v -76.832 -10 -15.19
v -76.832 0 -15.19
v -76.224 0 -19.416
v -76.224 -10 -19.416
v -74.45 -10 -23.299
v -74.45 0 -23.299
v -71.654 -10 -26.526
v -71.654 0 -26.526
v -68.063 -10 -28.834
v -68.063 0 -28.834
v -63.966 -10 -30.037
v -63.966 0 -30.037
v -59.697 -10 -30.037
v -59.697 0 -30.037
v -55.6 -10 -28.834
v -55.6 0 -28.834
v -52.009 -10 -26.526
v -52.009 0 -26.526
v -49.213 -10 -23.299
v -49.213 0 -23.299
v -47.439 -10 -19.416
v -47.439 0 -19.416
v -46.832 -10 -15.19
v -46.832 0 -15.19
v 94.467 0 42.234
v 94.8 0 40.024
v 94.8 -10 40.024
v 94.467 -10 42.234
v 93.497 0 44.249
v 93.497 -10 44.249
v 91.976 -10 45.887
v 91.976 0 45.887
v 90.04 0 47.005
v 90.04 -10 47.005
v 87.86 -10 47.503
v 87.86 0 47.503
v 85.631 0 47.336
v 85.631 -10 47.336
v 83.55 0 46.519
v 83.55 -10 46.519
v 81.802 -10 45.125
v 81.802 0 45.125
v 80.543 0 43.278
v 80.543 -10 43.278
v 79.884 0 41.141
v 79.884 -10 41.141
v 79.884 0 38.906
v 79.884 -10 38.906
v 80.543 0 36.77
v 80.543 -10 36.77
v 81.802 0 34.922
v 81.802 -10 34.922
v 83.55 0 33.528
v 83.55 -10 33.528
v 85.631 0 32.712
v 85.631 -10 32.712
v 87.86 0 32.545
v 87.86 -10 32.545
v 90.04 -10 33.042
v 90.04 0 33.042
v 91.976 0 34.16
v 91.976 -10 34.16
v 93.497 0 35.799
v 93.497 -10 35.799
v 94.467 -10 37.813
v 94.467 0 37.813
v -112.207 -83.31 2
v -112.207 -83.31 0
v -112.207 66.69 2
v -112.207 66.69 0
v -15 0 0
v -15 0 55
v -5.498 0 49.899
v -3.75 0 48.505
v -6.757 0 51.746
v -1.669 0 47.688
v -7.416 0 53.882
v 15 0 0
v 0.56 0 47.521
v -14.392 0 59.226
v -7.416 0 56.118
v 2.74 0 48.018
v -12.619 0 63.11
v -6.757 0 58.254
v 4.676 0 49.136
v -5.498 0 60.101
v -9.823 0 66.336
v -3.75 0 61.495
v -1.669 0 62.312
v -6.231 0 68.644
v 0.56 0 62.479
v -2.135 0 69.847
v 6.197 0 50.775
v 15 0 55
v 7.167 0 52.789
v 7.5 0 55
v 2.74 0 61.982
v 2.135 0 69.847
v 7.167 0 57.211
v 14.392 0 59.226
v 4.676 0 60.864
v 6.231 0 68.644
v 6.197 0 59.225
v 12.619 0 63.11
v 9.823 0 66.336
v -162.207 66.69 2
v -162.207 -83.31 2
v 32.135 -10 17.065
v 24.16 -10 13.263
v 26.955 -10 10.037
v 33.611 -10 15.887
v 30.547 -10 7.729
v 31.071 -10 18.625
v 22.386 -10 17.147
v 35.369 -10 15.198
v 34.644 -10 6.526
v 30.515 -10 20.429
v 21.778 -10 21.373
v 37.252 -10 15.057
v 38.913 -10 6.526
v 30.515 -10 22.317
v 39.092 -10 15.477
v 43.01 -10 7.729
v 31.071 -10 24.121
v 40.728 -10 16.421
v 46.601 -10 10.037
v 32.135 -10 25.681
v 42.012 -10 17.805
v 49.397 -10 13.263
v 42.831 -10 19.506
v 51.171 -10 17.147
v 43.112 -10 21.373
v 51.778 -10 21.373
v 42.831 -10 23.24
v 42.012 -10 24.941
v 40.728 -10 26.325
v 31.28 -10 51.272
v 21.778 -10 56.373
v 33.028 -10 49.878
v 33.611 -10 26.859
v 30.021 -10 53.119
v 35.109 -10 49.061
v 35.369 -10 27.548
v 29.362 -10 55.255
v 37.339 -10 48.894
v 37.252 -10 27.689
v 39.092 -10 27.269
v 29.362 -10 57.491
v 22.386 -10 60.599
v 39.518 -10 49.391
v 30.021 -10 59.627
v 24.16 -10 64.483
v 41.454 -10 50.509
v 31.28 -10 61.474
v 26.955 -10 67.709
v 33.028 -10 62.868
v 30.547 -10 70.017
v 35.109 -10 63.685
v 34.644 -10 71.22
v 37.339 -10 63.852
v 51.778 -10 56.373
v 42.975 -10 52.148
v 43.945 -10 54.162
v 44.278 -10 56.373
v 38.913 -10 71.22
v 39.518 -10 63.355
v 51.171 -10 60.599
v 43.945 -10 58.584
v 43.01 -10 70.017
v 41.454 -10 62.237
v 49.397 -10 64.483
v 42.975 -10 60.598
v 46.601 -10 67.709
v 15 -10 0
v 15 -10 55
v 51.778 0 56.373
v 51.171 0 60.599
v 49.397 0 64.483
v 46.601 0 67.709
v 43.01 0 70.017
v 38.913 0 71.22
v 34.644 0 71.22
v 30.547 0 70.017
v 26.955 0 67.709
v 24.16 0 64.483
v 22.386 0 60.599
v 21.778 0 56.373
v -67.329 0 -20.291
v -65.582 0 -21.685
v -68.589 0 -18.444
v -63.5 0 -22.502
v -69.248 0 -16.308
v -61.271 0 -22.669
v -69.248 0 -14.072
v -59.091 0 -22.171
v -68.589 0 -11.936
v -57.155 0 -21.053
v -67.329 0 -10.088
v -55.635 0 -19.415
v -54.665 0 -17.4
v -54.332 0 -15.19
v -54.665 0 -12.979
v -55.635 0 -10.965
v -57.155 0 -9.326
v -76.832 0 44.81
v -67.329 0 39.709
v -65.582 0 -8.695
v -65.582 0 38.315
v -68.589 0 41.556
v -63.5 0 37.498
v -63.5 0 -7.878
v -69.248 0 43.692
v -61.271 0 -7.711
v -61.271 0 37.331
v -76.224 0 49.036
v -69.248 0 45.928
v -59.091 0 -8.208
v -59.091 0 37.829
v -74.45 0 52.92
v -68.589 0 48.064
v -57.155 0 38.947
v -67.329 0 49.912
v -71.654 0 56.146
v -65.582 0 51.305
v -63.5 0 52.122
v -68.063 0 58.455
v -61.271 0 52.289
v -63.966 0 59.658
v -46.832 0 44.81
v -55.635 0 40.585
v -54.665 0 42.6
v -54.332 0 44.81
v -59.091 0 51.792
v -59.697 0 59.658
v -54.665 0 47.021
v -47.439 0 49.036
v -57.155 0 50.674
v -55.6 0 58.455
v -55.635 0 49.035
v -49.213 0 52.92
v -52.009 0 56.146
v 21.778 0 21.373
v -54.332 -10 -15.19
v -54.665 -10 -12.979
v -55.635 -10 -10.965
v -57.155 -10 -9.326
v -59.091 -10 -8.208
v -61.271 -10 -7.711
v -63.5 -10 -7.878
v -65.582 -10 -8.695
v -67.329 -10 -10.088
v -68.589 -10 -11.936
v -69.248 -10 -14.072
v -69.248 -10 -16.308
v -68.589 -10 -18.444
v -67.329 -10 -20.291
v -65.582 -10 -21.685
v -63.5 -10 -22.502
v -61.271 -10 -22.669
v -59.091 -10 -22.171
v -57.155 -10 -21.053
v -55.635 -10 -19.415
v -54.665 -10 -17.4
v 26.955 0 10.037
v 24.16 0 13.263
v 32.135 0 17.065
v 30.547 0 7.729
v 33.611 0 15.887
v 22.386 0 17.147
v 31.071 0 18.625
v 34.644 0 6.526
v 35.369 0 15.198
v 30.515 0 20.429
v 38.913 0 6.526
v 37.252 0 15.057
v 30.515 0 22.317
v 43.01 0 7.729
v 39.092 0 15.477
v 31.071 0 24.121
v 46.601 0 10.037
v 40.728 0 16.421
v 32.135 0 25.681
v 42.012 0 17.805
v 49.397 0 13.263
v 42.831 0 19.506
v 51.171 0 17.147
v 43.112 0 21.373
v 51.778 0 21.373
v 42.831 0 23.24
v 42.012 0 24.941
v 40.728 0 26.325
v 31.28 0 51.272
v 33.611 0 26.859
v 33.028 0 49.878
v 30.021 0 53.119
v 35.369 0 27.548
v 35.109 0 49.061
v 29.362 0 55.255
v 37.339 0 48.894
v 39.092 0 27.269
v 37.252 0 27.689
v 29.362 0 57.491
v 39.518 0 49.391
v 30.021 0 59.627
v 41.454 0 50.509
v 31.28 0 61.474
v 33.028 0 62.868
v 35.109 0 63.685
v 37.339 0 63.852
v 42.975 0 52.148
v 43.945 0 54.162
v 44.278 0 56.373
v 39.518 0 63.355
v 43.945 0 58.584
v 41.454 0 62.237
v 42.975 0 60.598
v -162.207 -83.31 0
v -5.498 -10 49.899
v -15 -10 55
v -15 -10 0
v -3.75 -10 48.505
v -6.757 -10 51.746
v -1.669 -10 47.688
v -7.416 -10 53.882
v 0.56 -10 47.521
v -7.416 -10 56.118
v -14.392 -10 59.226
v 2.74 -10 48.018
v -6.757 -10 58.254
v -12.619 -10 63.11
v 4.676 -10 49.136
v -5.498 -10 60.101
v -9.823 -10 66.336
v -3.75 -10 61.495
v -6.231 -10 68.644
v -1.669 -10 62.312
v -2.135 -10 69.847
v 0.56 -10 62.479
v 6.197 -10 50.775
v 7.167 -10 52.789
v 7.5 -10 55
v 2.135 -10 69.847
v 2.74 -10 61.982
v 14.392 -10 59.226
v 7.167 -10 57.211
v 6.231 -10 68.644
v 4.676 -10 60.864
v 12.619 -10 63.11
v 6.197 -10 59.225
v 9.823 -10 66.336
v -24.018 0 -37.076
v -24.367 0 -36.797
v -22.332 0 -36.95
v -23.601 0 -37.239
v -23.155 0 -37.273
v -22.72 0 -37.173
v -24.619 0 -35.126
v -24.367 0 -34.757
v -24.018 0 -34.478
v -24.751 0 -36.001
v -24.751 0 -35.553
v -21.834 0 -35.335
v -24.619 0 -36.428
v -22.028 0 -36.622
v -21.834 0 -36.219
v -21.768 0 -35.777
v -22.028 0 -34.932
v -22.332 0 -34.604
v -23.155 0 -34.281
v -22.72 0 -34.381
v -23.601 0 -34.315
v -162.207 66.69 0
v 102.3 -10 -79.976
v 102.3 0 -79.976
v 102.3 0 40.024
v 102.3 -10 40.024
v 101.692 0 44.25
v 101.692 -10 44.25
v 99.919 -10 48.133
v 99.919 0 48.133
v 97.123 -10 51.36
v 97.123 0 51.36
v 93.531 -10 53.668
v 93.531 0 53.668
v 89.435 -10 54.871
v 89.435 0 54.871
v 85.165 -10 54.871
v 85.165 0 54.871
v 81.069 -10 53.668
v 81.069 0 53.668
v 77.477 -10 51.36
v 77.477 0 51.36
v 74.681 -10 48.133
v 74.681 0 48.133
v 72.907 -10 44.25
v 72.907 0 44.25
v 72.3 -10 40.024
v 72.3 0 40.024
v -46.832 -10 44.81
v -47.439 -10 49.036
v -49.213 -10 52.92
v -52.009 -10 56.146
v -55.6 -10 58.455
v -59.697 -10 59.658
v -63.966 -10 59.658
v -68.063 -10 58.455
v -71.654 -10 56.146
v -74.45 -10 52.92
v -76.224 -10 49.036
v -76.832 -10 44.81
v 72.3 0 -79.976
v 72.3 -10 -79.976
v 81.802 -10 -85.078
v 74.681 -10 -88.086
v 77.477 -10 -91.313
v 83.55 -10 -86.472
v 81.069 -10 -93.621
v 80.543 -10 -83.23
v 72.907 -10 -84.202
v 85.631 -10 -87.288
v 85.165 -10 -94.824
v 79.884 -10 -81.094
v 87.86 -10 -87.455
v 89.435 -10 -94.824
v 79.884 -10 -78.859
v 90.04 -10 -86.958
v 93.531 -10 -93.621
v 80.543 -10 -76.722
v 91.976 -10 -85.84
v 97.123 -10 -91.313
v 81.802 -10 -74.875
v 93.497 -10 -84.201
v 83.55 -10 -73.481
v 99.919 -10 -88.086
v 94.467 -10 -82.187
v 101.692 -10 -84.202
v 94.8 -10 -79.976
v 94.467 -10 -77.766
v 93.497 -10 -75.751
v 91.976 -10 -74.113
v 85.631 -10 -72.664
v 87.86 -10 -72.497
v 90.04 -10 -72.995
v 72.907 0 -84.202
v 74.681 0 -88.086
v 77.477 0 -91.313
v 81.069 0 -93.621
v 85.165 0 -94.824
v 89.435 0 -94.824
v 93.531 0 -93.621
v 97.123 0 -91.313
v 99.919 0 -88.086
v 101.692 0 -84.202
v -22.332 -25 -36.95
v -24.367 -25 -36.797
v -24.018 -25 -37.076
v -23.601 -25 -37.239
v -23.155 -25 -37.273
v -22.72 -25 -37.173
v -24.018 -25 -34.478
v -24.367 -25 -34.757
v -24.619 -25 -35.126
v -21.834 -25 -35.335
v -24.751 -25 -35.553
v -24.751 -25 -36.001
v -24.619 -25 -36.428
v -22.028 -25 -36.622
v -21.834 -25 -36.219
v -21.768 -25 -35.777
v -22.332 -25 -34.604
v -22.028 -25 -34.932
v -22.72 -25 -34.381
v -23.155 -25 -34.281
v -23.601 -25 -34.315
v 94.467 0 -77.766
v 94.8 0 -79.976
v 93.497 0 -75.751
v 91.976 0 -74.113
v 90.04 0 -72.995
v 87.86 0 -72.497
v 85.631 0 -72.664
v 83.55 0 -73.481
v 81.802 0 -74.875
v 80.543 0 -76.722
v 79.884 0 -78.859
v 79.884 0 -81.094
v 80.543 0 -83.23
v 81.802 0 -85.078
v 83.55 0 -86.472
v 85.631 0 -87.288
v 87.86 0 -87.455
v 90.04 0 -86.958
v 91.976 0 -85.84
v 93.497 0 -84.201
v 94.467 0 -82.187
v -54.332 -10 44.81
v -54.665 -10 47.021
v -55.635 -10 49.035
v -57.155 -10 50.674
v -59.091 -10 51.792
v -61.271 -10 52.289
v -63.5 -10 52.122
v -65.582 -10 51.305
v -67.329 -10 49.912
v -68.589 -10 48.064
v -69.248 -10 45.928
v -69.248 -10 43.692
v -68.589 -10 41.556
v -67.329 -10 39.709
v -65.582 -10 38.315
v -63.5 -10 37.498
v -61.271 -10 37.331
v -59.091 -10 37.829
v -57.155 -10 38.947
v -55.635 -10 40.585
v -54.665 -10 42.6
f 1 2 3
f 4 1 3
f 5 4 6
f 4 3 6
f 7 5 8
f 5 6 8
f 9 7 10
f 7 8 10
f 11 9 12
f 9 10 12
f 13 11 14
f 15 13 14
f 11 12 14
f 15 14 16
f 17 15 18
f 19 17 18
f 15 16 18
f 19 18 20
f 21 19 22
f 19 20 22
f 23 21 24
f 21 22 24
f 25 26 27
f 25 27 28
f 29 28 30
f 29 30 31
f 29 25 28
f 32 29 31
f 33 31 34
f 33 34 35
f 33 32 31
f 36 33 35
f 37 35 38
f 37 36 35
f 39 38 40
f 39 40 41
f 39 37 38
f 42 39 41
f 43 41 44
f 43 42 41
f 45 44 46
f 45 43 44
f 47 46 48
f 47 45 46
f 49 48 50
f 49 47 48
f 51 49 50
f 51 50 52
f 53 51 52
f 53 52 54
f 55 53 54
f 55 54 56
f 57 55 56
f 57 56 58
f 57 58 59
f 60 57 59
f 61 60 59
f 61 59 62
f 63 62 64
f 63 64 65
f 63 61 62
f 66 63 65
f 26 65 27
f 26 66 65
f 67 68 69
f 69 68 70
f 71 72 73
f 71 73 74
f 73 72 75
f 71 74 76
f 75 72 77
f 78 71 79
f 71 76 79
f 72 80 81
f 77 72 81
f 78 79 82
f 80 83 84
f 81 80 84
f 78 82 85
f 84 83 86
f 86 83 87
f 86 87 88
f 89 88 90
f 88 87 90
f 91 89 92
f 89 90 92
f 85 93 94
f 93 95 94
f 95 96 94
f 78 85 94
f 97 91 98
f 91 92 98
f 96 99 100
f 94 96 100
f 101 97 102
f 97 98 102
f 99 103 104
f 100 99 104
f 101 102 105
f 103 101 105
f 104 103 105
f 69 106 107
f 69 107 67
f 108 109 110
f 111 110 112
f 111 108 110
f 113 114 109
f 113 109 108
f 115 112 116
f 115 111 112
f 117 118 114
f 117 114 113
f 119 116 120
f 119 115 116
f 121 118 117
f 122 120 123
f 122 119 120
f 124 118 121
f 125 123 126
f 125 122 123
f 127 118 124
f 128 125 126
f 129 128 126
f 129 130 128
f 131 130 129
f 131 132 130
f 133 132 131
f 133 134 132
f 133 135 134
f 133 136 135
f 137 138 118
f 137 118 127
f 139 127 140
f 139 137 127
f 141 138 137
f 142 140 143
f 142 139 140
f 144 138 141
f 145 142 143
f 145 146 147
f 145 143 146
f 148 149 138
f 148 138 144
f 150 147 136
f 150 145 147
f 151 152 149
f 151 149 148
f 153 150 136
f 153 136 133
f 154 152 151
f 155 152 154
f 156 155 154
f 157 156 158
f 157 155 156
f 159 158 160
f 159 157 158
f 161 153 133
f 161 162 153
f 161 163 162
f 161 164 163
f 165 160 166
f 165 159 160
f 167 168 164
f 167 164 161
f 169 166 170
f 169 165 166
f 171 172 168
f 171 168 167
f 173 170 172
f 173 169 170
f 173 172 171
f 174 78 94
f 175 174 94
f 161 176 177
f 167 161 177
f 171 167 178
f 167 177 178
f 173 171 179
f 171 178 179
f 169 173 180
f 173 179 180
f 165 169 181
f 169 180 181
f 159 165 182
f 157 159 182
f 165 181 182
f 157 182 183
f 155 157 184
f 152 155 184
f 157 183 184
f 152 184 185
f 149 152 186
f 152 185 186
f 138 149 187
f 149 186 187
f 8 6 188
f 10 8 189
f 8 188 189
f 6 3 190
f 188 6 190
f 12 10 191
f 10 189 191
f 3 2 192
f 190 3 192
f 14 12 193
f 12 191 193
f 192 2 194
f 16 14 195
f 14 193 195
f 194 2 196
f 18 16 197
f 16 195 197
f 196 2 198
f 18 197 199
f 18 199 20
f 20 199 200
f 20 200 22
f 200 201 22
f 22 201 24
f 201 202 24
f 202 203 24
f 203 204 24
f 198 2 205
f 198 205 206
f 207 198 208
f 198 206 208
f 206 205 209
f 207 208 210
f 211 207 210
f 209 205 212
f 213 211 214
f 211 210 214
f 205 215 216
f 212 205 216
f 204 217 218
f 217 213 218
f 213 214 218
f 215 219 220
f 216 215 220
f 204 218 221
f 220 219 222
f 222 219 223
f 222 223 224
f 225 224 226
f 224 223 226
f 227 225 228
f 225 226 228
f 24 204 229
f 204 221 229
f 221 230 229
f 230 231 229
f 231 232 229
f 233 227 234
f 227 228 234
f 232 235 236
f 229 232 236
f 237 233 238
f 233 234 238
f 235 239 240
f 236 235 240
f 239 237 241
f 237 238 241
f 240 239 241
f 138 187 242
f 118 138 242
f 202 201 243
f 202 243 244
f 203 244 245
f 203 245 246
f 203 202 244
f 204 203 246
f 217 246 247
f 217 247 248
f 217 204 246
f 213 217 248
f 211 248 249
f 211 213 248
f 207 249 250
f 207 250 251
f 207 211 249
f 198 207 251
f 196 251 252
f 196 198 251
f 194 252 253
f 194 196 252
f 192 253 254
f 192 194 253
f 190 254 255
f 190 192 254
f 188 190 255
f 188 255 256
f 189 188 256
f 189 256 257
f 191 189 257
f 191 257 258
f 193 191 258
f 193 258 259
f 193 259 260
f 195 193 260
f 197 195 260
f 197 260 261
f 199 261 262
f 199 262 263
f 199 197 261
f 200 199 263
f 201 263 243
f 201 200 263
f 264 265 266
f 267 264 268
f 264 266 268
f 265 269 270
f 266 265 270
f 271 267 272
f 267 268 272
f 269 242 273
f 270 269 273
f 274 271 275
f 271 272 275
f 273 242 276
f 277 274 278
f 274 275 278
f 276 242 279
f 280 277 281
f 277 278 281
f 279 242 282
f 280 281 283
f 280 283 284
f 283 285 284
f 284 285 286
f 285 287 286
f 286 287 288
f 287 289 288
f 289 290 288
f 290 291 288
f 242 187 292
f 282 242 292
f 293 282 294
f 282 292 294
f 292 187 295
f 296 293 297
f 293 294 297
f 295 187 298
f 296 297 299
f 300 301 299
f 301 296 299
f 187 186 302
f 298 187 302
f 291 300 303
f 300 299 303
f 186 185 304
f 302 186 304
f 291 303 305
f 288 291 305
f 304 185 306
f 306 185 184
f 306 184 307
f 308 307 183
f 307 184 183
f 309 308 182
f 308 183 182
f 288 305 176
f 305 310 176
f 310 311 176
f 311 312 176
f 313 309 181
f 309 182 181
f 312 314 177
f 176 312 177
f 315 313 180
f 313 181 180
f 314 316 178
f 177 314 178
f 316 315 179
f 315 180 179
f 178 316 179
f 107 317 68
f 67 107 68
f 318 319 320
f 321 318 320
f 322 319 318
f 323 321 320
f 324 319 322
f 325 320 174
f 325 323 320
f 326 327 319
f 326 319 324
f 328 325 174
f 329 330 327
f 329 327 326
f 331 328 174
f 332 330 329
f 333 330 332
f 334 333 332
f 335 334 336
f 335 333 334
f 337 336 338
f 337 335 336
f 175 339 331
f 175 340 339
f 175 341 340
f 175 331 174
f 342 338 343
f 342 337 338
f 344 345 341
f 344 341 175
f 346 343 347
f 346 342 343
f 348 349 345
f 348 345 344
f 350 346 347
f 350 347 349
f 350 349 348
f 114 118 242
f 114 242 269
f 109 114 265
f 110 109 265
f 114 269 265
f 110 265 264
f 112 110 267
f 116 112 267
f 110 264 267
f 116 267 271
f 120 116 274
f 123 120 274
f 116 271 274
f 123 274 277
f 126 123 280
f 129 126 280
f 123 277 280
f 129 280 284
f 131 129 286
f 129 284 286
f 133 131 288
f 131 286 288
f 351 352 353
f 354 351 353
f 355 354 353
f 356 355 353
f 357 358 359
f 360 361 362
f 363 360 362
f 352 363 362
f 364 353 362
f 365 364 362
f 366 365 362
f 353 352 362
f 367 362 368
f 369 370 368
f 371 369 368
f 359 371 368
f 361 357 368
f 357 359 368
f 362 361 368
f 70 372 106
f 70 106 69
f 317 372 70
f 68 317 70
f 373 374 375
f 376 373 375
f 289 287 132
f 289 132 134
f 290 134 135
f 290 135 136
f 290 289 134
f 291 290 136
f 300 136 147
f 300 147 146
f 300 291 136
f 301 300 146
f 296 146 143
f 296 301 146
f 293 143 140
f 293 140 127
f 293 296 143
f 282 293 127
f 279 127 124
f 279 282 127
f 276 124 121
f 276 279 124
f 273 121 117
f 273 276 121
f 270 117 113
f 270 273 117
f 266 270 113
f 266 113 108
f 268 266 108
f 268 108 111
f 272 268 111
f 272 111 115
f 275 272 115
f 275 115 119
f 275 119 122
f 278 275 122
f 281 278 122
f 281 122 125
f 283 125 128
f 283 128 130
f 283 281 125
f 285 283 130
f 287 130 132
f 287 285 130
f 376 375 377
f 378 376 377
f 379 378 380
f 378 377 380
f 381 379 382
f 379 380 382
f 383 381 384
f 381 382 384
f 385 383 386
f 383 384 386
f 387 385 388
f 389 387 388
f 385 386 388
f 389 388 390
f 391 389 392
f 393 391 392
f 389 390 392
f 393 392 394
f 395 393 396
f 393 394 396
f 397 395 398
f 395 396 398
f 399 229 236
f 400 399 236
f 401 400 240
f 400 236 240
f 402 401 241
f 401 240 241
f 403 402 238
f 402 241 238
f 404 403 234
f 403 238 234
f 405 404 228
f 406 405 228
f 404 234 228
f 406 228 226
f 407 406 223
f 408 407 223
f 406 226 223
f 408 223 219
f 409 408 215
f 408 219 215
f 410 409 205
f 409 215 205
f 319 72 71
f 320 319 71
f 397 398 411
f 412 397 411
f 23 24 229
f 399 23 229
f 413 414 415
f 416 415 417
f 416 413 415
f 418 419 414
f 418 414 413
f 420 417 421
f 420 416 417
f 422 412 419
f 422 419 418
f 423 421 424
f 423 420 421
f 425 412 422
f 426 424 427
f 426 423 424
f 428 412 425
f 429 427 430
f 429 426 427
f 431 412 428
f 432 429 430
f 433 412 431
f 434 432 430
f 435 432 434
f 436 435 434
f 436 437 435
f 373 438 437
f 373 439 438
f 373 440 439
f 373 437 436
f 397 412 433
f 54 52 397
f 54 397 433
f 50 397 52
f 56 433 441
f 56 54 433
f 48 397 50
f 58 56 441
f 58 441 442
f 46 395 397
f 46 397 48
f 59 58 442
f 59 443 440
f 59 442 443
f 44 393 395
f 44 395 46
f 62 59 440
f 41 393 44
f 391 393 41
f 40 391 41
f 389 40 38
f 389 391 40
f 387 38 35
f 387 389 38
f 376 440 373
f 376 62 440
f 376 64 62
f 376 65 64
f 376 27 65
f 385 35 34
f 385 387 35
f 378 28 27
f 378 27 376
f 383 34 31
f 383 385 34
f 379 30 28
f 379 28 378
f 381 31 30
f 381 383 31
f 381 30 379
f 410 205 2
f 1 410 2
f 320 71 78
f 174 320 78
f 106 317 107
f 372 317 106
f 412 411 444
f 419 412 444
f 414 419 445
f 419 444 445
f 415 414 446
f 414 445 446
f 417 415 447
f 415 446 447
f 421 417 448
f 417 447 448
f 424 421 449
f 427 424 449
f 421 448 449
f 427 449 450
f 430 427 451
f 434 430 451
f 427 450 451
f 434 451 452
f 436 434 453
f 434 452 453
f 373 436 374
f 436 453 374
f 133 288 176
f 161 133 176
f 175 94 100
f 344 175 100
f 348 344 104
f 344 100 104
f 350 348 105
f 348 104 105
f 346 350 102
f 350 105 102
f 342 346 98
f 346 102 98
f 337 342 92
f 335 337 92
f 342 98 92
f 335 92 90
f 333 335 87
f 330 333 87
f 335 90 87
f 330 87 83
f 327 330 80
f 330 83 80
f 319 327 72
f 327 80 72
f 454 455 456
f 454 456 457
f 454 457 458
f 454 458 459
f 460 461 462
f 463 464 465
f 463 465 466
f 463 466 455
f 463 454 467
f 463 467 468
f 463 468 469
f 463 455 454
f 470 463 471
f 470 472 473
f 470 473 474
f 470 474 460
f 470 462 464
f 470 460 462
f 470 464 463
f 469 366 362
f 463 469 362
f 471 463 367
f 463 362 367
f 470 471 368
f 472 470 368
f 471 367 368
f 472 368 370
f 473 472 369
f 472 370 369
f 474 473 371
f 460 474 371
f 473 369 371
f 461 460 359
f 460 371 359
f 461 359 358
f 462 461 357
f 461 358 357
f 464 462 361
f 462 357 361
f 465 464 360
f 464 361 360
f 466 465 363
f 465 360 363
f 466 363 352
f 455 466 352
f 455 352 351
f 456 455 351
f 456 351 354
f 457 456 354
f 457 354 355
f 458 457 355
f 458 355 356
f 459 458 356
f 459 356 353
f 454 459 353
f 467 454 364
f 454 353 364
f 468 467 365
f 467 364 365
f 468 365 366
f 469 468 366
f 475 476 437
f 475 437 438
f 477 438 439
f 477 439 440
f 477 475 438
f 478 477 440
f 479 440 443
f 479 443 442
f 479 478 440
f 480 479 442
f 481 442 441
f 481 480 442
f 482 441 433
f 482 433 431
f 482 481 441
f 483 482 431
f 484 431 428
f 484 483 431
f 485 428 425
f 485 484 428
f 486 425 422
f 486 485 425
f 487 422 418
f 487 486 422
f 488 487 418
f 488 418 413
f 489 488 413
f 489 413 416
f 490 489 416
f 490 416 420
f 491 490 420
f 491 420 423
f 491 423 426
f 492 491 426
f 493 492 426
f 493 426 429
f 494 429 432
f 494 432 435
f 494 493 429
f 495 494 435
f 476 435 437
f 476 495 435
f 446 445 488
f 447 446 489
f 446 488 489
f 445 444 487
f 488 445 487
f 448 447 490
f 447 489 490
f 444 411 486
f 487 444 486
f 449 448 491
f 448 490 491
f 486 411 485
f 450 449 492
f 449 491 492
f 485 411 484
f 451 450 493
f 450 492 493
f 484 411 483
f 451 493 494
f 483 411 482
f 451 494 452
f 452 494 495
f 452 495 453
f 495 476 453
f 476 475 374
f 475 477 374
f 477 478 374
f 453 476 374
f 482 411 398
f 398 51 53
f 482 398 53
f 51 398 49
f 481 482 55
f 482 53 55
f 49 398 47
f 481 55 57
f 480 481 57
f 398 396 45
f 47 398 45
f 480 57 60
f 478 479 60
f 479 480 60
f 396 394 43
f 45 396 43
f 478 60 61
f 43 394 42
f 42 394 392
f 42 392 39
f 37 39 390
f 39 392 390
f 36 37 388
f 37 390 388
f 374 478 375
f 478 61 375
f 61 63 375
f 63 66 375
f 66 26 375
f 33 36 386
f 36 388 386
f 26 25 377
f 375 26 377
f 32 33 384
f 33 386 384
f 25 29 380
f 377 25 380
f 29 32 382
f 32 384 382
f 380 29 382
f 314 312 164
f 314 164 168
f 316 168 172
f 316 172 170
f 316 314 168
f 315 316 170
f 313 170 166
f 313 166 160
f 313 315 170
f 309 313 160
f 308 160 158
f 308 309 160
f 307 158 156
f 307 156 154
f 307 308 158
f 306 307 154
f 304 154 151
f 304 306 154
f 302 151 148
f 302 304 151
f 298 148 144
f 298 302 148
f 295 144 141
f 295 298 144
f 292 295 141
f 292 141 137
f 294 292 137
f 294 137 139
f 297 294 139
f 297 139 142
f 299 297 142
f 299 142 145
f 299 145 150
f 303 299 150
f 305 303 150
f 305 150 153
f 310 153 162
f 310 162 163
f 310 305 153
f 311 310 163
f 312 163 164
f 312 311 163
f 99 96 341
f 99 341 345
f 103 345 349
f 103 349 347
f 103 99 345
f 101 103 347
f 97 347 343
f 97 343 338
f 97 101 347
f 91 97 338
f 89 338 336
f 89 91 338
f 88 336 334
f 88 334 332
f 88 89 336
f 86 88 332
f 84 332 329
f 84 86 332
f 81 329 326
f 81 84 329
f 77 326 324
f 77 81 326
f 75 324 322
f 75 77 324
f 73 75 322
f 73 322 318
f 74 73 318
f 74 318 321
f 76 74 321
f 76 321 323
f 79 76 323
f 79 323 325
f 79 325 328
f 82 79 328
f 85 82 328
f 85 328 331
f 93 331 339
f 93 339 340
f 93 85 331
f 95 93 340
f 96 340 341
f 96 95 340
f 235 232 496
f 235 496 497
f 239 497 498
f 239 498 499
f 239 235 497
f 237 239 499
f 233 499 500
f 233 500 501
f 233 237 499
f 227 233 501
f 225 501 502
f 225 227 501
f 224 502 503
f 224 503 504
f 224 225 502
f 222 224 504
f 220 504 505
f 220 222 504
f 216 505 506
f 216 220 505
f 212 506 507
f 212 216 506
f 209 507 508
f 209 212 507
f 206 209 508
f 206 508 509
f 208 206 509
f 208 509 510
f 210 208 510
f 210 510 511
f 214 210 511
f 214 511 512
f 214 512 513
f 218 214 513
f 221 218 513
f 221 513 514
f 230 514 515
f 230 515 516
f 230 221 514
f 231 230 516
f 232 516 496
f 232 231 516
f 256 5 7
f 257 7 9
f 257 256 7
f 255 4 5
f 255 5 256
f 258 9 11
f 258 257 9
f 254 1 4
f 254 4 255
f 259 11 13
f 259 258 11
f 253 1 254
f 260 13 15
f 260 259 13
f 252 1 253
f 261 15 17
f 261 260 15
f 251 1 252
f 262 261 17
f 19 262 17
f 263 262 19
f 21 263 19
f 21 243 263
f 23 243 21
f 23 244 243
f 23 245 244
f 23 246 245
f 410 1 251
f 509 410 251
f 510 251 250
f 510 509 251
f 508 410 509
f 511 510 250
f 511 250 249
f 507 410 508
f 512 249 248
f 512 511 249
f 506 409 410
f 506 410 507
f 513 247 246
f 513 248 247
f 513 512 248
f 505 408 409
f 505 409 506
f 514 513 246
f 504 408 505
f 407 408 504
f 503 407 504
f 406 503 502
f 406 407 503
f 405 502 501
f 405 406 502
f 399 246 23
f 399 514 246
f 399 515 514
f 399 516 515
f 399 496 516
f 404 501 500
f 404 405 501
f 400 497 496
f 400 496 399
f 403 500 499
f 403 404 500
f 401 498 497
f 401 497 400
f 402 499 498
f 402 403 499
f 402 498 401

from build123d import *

# Parameters (mm, degrees)
F0_R      = 7.5
F1_DEPTH  = 10
F2_R      = 7.5
F3_DEPTH  = 10
F4_R      = 6.334128
F4_R_2    = 7.5
F5_DEPTH  = 10
F6_R      = 7.5
F7_DEPTH  = 10
F8_W      = 50
F8_H      = 150
F9_DEPTH  = 2
F10_R     = 1.5
F11_DEPTH = 25


with BuildPart() as f1:
    # F0 (on Front) → F1 (new body)
    with BuildSketch(Plane.XZ):
        with BuildLine():
            Line((15, 0), (15, 55))
            ThreePointArc((15, 55), (0, 70), (-15, 55))
            Line((-15, 55), (-15, 0))
            Line((-15, 0), (15, 0))
        make_face()
        with Locations((0, 55)):
            Circle(F0_R, mode=Mode.SUBTRACT)
    extrude(amount=F1_DEPTH)


with BuildPart() as f3:
    # F2 (on Front) → F3 (new body)
    with BuildSketch(Plane.XZ):
        with BuildLine():
            Line((-46.831526, -15.18975), (-46.831526, 44.81025))
            ThreePointArc((-46.831526, 44.81025), (-61.831526, 59.81025), (-76.831526, 44.81025))
            Line((-76.831526, 44.81025), (-76.831526, -15.18975))
            ThreePointArc((-76.831526, -15.18975), (-61.831526, -30.18975), (-46.831526, -15.18975))
        make_face()
        with Locations((-61.831526, -15.18975)):
            Circle(F2_R, mode=Mode.SUBTRACT)
        with Locations((-61.831526, 44.81025)):
            Circle(F2_R, mode=Mode.SUBTRACT)
    extrude(amount=F3_DEPTH)


with BuildPart() as f5:
    # F4 (on Front) → F5 (new body)
    with BuildSketch(Plane.XZ):
        with BuildLine():
            Line((51.77831, 21.373001), (51.77831, 56.373001))
            ThreePointArc((51.77831, 56.373001), (36.77831, 71.373001), (21.77831, 56.373001))
            Line((21.77831, 56.373001), (21.77831, 21.373001))
            ThreePointArc((21.77831, 21.373001), (36.77831, 6.373001), (51.77831, 21.373001))
        make_face()
        with Locations((36.77831, 21.373001)):
            Circle(F4_R, mode=Mode.SUBTRACT)
        with Locations((36.77831, 56.373001)):
            Circle(F4_R_2, mode=Mode.SUBTRACT)
    extrude(amount=F5_DEPTH)


with BuildPart() as f7:
    # F6 (on Front) → F7 (new body)
    with BuildSketch(Plane.XZ):
        with BuildLine():
            Line((102.299824, -79.976364), (102.299824, 40.023636))
            ThreePointArc((102.299824, 40.023636), (87.299824, 55.023636), (72.299824, 40.023636))
            Line((72.299824, 40.023636), (72.299824, -79.976364))
            ThreePointArc((72.299824, -79.976364), (87.299824, -94.976364), (102.299824, -79.976364))
        make_face()
        with Locations((87.299824, -79.976364)):
            Circle(F6_R, mode=Mode.SUBTRACT)
        with Locations((87.299824, 40.023636)):
            Circle(F6_R, mode=Mode.SUBTRACT)
    extrude(amount=F7_DEPTH)


with BuildPart() as f9:
    # F8 (on Top) → F9 (new body)
    with BuildSketch(Plane.XY):
        with Locations((-137.206855, -8.310452)):
            Rectangle(F8_W, F8_H)
    extrude(amount=F9_DEPTH)


with BuildPart() as f11:
    # F10 (on Front) → F11 (new body)
    with BuildSketch(Plane.XZ):
        with Locations((-23.267521, -35.777029)):
            Circle(F10_R)
    extrude(amount=F11_DEPTH)


solid = Compound([f1.part, f3.part, f5.part, f7.part, f9.part, f11.part])
